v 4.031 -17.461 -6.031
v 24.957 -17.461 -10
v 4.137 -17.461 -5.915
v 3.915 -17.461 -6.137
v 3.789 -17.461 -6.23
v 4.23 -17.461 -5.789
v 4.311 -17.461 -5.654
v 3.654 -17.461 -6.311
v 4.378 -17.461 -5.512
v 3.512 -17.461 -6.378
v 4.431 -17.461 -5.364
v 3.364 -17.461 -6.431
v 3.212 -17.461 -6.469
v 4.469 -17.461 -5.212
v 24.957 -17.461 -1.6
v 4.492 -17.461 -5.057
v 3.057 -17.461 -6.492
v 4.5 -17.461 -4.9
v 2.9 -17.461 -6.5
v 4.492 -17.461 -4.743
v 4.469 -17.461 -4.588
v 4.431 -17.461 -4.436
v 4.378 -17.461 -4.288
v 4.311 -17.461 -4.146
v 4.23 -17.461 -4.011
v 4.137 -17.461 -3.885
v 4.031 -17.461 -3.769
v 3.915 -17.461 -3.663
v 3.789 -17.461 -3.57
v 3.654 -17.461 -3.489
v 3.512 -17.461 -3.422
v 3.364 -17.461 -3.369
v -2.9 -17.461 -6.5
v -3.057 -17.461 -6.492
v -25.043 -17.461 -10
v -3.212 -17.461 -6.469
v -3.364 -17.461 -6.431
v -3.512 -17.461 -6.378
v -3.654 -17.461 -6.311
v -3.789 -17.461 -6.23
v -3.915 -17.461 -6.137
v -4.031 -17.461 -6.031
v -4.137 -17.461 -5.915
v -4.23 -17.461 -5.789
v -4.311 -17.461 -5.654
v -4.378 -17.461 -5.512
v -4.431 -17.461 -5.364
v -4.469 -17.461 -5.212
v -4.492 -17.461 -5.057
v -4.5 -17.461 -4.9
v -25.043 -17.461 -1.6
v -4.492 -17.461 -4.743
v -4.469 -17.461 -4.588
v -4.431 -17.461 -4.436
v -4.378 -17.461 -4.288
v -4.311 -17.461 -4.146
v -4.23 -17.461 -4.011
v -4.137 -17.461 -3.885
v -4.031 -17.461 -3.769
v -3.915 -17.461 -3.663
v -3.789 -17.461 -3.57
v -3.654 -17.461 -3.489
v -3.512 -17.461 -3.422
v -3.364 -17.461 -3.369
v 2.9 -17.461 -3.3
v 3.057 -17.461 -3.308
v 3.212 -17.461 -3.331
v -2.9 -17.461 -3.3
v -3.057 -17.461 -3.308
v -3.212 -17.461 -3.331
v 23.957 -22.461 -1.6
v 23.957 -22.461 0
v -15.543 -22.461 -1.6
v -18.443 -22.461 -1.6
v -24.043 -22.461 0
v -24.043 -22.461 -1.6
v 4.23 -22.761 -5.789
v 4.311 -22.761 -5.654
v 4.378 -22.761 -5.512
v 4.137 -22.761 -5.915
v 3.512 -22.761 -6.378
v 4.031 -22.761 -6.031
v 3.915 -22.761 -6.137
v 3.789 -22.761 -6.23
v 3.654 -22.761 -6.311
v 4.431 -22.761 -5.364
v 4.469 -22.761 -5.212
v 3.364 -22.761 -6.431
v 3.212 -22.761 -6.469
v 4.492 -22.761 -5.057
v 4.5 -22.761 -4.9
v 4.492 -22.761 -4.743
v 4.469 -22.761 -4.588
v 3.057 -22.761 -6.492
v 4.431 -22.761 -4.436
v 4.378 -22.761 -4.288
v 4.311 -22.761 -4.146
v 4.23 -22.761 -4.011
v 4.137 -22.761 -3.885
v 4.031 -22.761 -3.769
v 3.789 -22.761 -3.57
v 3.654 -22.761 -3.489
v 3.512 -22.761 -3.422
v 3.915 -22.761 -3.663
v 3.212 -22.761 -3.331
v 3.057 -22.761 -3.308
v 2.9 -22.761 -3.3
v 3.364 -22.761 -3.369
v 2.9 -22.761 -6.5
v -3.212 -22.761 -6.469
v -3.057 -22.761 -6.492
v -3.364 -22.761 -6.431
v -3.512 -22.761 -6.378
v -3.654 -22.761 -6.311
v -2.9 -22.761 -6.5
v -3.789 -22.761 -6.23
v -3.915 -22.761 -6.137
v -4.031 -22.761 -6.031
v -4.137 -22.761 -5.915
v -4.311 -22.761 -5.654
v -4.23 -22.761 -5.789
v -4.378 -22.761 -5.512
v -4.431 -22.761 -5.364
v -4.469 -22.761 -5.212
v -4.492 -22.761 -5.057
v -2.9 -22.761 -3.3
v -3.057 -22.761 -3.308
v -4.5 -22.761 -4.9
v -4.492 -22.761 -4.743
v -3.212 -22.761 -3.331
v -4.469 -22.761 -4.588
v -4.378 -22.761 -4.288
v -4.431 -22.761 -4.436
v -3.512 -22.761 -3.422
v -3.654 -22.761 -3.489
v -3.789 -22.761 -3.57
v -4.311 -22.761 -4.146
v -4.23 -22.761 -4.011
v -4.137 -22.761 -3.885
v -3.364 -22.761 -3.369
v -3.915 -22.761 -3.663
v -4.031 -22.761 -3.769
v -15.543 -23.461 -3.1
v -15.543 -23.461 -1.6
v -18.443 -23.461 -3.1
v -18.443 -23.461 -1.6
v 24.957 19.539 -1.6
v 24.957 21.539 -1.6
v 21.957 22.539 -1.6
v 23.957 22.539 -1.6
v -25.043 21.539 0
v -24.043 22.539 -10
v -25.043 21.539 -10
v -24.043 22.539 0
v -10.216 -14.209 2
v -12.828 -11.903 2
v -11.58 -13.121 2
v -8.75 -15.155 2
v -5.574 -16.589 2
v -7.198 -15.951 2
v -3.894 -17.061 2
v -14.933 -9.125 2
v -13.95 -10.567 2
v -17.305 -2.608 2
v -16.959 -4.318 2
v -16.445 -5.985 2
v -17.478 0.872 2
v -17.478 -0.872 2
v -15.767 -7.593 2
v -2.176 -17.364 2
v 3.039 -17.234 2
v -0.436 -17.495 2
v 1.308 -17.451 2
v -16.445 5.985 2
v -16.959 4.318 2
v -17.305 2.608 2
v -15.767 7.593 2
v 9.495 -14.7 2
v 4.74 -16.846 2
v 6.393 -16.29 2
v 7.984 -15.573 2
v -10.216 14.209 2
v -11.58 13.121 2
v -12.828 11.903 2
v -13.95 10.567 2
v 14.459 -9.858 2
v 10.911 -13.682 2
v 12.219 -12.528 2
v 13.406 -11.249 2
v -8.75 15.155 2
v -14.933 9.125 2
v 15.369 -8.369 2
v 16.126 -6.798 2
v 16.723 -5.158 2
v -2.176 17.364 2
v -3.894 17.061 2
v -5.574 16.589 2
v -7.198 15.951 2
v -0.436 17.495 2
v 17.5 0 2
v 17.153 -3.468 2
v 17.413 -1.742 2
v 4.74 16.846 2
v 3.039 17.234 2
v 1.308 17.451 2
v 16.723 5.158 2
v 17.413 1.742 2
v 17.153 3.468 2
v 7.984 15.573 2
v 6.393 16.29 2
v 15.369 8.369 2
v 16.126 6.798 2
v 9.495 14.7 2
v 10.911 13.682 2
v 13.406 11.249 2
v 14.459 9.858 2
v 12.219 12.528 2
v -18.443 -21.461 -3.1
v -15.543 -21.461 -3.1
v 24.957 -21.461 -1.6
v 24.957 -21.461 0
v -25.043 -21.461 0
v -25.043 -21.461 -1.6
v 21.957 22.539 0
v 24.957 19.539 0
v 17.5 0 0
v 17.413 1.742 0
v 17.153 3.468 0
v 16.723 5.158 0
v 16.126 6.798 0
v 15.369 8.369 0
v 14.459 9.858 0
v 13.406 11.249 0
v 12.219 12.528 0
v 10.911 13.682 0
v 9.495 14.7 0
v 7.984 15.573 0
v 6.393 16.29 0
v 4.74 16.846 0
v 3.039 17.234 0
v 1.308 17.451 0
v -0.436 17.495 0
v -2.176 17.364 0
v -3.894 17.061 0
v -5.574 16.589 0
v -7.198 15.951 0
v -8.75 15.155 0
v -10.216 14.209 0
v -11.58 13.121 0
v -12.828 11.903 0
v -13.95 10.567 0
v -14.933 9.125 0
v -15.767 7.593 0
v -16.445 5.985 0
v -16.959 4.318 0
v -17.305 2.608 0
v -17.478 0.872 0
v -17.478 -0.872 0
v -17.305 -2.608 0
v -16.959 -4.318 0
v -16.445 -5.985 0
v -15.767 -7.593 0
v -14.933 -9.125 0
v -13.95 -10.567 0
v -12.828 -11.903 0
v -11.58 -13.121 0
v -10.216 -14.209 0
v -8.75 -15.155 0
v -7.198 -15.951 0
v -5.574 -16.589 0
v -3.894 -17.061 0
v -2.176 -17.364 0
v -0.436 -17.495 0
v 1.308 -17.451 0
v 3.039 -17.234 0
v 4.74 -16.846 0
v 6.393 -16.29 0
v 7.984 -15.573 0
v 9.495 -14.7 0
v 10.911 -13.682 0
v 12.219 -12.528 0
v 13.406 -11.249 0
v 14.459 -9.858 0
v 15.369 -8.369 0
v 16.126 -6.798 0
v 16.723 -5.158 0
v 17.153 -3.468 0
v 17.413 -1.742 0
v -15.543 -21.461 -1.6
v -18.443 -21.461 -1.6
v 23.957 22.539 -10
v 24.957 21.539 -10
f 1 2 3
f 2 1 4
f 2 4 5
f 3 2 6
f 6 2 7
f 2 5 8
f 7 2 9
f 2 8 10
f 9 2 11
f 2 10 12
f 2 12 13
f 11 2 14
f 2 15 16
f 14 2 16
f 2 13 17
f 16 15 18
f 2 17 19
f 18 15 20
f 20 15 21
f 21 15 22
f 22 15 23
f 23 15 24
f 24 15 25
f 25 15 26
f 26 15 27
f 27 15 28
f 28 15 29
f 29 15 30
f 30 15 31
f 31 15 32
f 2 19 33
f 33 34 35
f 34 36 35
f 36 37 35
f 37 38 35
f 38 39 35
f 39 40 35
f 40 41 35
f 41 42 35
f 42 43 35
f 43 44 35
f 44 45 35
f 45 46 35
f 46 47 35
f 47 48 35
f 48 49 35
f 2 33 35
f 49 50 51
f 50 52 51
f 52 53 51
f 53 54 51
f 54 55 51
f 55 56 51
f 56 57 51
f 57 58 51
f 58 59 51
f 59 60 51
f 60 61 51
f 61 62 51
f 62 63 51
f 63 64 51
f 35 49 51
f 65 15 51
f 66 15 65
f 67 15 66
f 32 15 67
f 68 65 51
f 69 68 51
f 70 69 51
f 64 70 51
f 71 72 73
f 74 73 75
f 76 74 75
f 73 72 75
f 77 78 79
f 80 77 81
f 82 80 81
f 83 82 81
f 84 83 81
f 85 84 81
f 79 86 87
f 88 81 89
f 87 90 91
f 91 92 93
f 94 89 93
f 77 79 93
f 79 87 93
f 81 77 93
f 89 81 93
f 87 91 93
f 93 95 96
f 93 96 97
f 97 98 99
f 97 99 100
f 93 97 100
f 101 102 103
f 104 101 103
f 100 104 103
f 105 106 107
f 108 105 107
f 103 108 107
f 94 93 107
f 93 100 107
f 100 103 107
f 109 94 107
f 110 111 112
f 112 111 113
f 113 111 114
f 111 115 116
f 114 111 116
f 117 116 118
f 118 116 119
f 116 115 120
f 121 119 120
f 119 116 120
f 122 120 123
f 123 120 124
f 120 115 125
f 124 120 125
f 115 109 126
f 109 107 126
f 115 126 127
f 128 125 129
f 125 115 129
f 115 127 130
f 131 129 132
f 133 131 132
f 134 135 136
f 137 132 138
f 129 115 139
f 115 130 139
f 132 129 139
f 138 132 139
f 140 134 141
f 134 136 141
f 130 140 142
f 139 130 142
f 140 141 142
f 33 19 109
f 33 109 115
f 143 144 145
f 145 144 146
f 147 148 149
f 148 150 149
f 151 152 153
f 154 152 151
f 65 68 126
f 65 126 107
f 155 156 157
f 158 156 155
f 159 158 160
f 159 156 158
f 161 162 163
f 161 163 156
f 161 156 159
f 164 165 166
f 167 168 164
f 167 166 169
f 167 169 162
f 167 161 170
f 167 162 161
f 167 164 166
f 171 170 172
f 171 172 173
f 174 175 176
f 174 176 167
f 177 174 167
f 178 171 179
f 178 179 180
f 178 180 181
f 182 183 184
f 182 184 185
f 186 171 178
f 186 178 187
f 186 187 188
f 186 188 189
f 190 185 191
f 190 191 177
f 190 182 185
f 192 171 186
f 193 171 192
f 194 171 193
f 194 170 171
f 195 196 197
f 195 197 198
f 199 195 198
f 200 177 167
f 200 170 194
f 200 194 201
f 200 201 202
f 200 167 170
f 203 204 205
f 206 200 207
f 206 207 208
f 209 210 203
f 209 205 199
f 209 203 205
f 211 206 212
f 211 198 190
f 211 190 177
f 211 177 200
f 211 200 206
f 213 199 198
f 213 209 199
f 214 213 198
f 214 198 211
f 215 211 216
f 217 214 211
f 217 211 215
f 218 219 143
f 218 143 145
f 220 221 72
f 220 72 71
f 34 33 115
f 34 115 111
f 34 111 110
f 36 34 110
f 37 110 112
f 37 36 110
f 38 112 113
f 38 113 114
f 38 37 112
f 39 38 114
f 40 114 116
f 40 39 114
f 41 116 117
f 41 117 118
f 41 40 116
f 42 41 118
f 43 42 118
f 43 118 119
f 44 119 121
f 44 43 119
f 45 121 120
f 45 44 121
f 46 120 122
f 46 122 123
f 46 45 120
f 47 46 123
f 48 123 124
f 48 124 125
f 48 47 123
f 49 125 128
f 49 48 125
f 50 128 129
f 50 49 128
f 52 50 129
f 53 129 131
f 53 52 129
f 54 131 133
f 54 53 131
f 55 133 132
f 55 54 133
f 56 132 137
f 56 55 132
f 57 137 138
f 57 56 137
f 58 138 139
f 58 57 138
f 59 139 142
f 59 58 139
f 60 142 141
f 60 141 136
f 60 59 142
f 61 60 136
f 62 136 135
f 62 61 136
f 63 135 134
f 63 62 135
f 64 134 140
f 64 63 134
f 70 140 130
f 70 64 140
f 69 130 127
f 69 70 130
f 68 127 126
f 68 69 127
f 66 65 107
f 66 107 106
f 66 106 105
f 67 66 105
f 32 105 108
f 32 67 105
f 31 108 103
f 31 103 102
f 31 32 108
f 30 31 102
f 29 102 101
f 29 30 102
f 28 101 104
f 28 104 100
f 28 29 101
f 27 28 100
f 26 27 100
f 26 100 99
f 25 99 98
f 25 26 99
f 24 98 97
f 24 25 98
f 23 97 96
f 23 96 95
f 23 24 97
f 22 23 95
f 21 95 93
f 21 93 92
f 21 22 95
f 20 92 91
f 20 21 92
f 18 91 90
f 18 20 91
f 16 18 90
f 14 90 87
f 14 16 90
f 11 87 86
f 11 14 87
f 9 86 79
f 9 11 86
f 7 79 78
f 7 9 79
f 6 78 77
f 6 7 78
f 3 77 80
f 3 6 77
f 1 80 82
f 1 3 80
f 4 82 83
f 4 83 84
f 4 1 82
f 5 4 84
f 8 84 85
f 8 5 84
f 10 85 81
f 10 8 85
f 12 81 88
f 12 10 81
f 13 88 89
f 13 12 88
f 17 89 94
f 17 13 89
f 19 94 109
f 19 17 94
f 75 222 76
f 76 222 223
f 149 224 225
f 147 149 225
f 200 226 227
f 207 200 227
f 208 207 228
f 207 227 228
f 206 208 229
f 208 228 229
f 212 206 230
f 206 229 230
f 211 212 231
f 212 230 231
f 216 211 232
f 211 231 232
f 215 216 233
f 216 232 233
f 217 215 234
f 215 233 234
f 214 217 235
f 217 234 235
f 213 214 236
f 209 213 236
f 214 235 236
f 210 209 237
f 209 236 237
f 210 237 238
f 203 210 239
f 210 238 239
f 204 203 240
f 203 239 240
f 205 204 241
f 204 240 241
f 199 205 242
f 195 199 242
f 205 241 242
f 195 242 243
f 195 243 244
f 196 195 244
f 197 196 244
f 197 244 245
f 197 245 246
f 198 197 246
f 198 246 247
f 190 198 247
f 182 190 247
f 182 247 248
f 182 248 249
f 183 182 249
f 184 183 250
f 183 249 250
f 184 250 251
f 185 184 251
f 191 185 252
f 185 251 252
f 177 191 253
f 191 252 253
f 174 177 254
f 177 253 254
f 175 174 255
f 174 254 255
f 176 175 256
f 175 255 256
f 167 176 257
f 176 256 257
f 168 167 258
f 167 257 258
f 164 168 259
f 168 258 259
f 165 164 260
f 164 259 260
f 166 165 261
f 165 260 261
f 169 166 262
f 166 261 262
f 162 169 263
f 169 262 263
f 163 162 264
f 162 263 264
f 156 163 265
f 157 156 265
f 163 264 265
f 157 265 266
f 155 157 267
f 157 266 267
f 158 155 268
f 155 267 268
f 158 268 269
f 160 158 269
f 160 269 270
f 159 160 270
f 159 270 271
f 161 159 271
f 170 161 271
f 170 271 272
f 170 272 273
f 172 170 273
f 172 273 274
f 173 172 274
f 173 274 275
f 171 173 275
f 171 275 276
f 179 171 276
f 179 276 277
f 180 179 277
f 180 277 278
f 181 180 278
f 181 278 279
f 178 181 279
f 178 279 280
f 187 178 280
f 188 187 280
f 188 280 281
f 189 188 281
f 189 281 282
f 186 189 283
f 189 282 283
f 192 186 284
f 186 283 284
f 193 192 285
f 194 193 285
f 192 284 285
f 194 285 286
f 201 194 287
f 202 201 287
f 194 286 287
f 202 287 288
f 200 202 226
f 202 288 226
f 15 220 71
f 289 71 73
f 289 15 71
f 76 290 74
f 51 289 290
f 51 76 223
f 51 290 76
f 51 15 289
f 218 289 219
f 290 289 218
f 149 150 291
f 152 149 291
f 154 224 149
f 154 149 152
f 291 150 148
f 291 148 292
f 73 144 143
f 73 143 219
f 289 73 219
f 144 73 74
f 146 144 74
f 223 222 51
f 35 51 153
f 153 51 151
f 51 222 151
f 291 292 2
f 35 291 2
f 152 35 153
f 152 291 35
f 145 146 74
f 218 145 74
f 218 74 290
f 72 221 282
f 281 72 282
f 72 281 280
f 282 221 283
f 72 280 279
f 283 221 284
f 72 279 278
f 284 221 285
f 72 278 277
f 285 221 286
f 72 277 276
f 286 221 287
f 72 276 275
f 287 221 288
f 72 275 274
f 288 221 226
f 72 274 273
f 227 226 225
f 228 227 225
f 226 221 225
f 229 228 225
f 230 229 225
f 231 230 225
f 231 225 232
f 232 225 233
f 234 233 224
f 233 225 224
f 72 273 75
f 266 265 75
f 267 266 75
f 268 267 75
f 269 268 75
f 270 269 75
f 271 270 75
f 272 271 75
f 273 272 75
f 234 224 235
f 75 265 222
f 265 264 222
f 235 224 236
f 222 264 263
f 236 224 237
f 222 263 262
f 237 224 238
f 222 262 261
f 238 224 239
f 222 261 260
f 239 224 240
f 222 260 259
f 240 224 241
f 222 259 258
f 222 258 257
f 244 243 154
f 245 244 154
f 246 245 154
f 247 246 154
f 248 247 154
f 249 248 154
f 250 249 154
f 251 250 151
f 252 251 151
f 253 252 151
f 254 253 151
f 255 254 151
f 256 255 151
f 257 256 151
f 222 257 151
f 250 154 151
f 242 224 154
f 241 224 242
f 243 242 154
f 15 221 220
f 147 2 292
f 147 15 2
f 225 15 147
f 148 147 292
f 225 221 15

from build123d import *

# Parameters (mm, degrees)
EXTRUDE_1_DEPTH = 1.6
SKETCH_2_R      = 17.5
EXTRUDE_2_DEPTH = 2
SKETCH_3_W      = 50
SKETCH_3_H      = 40
EXTRUDE_3_DEPTH = 8.4
EXTRUDE_4_DEPTH = 5.3
SKETCH_5_W      = 2.9
SKETCH_5_H      = 2
EXTRUDE_5_DEPTH = 1.5
CHAMFER_1_SIZE  = 1


with BuildPart() as part:
    # 草图1 → 凸台-拉伸1 (new body)
    with BuildSketch(Plane.XY):
        Polygon((21.95697074, 22.538726334), (24.95697074, 19.538726334), (24.95697074, -22.461273666), (-25.04302926, -22.461273666), (-25.04302926, 22.538726334), align=None)
    extrude(amount=-EXTRUDE_1_DEPTH)

    # 草图2 → 凸台-拉伸2 (add)
    with BuildSketch(Plane.XY):
        Circle(SKETCH_2_R)
    extrude(amount=EXTRUDE_2_DEPTH)

    # 草图3 → 凸台-拉伸3 (add)
    with BuildSketch(Plane(origin=(0, 0, -1.6), x_dir=(-1, 0, 0), z_dir=(0, 0, -1))):
        with Locations((0.04302926, 2.538726334)):
            Rectangle(SKETCH_3_W, SKETCH_3_H)
    extrude(amount=EXTRUDE_3_DEPTH)

    # 草图4 → 凸台-拉伸4 (add)
    with BuildSketch(Plane.XZ.offset(17.461273666)):
        with BuildLine():
            Line((-2.9, -3.3), (2.9, -3.3))
            ThreePointArc((2.9, -3.3), (4.5, -4.9), (2.9, -6.5))
            Line((2.9, -6.5), (-2.9, -6.5))
            ThreePointArc((-2.9, -6.5), (-4.5, -4.9), (-2.9, -3.3))
        make_face()
    extrude(amount=EXTRUDE_4_DEPTH)

    # 草图5 → 凸台-拉伸5 (add)
    with BuildSketch(Plane(origin=(0, 0, -1.6), x_dir=(-1, 0, 0), z_dir=(0, 0, -1))):
        with Locations((16.99302926, -22.461273666)):
            Rectangle(SKETCH_5_W, SKETCH_5_H)
    extrude(amount=EXTRUDE_5_DEPTH)

    # 倒角1
    chamfer_1_edges = [part.edges().sort_by_distance(p)[0] for p in [
        (24.95697074, 22.538726334, -5.8),
        (-25.04302926, 22.538726334, -5),
        (24.95697074, -22.461273666, -0.8),
        (-25.04302926, -22.461273666, -0.8),
    ]]
    chamfer(chamfer_1_edges, length=CHAMFER_1_SIZE)


solid = part.part
